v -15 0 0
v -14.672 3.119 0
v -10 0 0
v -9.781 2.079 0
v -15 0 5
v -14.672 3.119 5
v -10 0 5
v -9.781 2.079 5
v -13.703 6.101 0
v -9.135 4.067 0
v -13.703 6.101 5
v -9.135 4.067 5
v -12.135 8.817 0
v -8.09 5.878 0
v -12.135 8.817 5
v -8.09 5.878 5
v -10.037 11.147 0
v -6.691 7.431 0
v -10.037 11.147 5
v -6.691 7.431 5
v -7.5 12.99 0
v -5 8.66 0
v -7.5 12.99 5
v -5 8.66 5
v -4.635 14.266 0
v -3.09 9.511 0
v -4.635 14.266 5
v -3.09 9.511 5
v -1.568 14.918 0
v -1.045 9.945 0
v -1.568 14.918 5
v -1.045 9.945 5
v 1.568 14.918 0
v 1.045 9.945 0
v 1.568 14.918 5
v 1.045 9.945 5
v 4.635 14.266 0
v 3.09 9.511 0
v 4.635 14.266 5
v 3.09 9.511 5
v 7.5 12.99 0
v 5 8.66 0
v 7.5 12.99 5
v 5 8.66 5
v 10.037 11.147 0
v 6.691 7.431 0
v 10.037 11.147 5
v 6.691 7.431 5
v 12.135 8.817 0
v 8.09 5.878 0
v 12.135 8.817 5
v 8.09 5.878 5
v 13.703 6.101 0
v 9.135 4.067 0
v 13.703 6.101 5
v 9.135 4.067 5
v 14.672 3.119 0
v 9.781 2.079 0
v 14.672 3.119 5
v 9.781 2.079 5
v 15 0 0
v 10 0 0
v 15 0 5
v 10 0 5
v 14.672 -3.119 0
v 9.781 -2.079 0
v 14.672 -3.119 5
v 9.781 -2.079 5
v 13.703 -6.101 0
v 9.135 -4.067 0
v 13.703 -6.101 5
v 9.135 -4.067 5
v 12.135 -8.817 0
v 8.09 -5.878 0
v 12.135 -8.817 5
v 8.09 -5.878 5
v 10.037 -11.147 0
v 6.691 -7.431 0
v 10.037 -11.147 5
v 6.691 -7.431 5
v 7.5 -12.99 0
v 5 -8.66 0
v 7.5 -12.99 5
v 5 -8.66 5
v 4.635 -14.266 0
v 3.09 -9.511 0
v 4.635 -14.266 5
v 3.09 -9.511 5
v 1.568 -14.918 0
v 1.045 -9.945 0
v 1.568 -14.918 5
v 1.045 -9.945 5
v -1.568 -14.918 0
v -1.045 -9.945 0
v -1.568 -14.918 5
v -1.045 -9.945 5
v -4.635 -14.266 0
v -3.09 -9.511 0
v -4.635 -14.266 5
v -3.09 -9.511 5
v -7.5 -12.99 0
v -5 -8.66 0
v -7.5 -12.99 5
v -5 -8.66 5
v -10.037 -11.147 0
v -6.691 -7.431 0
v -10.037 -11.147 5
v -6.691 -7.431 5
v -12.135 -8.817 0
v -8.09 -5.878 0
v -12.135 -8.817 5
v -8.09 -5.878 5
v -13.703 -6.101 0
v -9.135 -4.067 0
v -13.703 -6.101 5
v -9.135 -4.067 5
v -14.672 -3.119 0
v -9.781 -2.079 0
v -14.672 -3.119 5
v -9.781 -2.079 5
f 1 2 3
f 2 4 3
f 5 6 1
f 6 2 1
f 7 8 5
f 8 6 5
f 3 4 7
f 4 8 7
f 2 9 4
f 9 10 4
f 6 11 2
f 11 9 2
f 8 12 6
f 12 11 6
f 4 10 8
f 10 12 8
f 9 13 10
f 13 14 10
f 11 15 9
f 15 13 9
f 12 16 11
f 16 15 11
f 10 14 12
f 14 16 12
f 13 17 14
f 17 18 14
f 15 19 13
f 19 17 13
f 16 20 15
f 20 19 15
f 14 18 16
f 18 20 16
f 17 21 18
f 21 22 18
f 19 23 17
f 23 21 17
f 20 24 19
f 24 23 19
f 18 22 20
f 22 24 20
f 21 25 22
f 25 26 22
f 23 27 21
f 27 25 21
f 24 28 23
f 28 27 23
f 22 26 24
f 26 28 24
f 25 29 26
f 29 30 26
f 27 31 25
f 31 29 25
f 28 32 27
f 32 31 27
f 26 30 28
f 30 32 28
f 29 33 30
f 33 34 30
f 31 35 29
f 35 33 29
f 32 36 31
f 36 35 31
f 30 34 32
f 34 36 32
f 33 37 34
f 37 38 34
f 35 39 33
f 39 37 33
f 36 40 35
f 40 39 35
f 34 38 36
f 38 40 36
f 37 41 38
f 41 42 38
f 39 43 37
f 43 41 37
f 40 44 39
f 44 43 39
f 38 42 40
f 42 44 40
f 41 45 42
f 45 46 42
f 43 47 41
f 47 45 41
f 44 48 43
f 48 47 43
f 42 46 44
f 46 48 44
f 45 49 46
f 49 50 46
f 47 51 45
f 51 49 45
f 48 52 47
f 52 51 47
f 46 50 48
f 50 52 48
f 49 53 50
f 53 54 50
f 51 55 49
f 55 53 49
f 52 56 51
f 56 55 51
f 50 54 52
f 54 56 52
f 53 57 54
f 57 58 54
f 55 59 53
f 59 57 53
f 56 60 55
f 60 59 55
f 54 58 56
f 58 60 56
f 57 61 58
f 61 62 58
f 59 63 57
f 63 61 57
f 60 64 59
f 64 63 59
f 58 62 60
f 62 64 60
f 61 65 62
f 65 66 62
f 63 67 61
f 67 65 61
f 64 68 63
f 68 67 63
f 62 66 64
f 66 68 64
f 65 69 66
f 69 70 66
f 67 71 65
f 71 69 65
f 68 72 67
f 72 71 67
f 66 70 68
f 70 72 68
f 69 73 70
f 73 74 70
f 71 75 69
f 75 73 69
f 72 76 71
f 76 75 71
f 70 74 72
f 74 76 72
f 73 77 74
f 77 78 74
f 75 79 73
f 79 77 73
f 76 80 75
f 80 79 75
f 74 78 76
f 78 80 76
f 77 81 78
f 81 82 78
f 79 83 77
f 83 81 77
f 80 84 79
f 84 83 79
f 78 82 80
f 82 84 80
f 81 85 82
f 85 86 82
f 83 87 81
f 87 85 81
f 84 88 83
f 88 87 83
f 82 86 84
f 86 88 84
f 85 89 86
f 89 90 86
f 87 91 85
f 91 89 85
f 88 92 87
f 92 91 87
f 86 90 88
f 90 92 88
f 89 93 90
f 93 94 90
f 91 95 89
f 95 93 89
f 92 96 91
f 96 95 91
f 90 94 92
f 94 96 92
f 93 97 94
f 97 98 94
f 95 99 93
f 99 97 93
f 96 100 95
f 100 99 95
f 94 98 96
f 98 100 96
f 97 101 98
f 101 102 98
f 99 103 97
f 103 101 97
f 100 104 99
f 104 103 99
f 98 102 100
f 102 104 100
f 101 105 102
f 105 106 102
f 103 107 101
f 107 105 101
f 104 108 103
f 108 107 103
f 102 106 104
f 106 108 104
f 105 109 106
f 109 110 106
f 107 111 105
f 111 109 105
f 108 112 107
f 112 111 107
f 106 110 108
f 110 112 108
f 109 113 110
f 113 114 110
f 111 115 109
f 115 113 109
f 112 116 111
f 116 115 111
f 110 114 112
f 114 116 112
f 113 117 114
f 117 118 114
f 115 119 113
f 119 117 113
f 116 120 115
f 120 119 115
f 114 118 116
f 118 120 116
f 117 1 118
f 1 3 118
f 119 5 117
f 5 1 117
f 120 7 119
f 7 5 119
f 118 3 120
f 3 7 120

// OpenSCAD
color("red")
    rotate_extrude()
        translate([10, 0])
            square(5);
